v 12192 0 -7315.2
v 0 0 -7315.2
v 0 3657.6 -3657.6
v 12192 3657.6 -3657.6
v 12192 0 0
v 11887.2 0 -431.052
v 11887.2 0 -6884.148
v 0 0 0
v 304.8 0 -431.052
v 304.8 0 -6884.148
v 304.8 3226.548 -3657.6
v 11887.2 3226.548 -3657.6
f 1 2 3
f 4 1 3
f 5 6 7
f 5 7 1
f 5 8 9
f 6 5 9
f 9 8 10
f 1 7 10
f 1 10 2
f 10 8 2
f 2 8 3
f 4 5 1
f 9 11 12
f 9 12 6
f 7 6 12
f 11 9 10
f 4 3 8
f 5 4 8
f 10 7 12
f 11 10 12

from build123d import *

# Parameters (mm, degrees)
BOSS_EXTRUDE1_DEPTH = 12192
SHELL1_T            = -304.8


with BuildPart() as part:
    # Sketch1 → Boss-Extrude1 (new body)
    with BuildSketch(Plane(origin=(0, 0, 0), x_dir=(0, 0, -1), z_dir=(1, 0, 0))):
        Polygon((0, 0), (7315.2, 0), (3657.6, 3657.6), align=None)
    extrude(amount=BOSS_EXTRUDE1_DEPTH)

    # Shell1
    shell1_openings = [part.faces().sort_by_distance(p)[0] for p in [
        (6096, 0, -3657.6),
    ]]
    offset(amount=SHELL1_T, openings=shell1_openings, kind=Kind.INTERSECTION)


solid = part.part
